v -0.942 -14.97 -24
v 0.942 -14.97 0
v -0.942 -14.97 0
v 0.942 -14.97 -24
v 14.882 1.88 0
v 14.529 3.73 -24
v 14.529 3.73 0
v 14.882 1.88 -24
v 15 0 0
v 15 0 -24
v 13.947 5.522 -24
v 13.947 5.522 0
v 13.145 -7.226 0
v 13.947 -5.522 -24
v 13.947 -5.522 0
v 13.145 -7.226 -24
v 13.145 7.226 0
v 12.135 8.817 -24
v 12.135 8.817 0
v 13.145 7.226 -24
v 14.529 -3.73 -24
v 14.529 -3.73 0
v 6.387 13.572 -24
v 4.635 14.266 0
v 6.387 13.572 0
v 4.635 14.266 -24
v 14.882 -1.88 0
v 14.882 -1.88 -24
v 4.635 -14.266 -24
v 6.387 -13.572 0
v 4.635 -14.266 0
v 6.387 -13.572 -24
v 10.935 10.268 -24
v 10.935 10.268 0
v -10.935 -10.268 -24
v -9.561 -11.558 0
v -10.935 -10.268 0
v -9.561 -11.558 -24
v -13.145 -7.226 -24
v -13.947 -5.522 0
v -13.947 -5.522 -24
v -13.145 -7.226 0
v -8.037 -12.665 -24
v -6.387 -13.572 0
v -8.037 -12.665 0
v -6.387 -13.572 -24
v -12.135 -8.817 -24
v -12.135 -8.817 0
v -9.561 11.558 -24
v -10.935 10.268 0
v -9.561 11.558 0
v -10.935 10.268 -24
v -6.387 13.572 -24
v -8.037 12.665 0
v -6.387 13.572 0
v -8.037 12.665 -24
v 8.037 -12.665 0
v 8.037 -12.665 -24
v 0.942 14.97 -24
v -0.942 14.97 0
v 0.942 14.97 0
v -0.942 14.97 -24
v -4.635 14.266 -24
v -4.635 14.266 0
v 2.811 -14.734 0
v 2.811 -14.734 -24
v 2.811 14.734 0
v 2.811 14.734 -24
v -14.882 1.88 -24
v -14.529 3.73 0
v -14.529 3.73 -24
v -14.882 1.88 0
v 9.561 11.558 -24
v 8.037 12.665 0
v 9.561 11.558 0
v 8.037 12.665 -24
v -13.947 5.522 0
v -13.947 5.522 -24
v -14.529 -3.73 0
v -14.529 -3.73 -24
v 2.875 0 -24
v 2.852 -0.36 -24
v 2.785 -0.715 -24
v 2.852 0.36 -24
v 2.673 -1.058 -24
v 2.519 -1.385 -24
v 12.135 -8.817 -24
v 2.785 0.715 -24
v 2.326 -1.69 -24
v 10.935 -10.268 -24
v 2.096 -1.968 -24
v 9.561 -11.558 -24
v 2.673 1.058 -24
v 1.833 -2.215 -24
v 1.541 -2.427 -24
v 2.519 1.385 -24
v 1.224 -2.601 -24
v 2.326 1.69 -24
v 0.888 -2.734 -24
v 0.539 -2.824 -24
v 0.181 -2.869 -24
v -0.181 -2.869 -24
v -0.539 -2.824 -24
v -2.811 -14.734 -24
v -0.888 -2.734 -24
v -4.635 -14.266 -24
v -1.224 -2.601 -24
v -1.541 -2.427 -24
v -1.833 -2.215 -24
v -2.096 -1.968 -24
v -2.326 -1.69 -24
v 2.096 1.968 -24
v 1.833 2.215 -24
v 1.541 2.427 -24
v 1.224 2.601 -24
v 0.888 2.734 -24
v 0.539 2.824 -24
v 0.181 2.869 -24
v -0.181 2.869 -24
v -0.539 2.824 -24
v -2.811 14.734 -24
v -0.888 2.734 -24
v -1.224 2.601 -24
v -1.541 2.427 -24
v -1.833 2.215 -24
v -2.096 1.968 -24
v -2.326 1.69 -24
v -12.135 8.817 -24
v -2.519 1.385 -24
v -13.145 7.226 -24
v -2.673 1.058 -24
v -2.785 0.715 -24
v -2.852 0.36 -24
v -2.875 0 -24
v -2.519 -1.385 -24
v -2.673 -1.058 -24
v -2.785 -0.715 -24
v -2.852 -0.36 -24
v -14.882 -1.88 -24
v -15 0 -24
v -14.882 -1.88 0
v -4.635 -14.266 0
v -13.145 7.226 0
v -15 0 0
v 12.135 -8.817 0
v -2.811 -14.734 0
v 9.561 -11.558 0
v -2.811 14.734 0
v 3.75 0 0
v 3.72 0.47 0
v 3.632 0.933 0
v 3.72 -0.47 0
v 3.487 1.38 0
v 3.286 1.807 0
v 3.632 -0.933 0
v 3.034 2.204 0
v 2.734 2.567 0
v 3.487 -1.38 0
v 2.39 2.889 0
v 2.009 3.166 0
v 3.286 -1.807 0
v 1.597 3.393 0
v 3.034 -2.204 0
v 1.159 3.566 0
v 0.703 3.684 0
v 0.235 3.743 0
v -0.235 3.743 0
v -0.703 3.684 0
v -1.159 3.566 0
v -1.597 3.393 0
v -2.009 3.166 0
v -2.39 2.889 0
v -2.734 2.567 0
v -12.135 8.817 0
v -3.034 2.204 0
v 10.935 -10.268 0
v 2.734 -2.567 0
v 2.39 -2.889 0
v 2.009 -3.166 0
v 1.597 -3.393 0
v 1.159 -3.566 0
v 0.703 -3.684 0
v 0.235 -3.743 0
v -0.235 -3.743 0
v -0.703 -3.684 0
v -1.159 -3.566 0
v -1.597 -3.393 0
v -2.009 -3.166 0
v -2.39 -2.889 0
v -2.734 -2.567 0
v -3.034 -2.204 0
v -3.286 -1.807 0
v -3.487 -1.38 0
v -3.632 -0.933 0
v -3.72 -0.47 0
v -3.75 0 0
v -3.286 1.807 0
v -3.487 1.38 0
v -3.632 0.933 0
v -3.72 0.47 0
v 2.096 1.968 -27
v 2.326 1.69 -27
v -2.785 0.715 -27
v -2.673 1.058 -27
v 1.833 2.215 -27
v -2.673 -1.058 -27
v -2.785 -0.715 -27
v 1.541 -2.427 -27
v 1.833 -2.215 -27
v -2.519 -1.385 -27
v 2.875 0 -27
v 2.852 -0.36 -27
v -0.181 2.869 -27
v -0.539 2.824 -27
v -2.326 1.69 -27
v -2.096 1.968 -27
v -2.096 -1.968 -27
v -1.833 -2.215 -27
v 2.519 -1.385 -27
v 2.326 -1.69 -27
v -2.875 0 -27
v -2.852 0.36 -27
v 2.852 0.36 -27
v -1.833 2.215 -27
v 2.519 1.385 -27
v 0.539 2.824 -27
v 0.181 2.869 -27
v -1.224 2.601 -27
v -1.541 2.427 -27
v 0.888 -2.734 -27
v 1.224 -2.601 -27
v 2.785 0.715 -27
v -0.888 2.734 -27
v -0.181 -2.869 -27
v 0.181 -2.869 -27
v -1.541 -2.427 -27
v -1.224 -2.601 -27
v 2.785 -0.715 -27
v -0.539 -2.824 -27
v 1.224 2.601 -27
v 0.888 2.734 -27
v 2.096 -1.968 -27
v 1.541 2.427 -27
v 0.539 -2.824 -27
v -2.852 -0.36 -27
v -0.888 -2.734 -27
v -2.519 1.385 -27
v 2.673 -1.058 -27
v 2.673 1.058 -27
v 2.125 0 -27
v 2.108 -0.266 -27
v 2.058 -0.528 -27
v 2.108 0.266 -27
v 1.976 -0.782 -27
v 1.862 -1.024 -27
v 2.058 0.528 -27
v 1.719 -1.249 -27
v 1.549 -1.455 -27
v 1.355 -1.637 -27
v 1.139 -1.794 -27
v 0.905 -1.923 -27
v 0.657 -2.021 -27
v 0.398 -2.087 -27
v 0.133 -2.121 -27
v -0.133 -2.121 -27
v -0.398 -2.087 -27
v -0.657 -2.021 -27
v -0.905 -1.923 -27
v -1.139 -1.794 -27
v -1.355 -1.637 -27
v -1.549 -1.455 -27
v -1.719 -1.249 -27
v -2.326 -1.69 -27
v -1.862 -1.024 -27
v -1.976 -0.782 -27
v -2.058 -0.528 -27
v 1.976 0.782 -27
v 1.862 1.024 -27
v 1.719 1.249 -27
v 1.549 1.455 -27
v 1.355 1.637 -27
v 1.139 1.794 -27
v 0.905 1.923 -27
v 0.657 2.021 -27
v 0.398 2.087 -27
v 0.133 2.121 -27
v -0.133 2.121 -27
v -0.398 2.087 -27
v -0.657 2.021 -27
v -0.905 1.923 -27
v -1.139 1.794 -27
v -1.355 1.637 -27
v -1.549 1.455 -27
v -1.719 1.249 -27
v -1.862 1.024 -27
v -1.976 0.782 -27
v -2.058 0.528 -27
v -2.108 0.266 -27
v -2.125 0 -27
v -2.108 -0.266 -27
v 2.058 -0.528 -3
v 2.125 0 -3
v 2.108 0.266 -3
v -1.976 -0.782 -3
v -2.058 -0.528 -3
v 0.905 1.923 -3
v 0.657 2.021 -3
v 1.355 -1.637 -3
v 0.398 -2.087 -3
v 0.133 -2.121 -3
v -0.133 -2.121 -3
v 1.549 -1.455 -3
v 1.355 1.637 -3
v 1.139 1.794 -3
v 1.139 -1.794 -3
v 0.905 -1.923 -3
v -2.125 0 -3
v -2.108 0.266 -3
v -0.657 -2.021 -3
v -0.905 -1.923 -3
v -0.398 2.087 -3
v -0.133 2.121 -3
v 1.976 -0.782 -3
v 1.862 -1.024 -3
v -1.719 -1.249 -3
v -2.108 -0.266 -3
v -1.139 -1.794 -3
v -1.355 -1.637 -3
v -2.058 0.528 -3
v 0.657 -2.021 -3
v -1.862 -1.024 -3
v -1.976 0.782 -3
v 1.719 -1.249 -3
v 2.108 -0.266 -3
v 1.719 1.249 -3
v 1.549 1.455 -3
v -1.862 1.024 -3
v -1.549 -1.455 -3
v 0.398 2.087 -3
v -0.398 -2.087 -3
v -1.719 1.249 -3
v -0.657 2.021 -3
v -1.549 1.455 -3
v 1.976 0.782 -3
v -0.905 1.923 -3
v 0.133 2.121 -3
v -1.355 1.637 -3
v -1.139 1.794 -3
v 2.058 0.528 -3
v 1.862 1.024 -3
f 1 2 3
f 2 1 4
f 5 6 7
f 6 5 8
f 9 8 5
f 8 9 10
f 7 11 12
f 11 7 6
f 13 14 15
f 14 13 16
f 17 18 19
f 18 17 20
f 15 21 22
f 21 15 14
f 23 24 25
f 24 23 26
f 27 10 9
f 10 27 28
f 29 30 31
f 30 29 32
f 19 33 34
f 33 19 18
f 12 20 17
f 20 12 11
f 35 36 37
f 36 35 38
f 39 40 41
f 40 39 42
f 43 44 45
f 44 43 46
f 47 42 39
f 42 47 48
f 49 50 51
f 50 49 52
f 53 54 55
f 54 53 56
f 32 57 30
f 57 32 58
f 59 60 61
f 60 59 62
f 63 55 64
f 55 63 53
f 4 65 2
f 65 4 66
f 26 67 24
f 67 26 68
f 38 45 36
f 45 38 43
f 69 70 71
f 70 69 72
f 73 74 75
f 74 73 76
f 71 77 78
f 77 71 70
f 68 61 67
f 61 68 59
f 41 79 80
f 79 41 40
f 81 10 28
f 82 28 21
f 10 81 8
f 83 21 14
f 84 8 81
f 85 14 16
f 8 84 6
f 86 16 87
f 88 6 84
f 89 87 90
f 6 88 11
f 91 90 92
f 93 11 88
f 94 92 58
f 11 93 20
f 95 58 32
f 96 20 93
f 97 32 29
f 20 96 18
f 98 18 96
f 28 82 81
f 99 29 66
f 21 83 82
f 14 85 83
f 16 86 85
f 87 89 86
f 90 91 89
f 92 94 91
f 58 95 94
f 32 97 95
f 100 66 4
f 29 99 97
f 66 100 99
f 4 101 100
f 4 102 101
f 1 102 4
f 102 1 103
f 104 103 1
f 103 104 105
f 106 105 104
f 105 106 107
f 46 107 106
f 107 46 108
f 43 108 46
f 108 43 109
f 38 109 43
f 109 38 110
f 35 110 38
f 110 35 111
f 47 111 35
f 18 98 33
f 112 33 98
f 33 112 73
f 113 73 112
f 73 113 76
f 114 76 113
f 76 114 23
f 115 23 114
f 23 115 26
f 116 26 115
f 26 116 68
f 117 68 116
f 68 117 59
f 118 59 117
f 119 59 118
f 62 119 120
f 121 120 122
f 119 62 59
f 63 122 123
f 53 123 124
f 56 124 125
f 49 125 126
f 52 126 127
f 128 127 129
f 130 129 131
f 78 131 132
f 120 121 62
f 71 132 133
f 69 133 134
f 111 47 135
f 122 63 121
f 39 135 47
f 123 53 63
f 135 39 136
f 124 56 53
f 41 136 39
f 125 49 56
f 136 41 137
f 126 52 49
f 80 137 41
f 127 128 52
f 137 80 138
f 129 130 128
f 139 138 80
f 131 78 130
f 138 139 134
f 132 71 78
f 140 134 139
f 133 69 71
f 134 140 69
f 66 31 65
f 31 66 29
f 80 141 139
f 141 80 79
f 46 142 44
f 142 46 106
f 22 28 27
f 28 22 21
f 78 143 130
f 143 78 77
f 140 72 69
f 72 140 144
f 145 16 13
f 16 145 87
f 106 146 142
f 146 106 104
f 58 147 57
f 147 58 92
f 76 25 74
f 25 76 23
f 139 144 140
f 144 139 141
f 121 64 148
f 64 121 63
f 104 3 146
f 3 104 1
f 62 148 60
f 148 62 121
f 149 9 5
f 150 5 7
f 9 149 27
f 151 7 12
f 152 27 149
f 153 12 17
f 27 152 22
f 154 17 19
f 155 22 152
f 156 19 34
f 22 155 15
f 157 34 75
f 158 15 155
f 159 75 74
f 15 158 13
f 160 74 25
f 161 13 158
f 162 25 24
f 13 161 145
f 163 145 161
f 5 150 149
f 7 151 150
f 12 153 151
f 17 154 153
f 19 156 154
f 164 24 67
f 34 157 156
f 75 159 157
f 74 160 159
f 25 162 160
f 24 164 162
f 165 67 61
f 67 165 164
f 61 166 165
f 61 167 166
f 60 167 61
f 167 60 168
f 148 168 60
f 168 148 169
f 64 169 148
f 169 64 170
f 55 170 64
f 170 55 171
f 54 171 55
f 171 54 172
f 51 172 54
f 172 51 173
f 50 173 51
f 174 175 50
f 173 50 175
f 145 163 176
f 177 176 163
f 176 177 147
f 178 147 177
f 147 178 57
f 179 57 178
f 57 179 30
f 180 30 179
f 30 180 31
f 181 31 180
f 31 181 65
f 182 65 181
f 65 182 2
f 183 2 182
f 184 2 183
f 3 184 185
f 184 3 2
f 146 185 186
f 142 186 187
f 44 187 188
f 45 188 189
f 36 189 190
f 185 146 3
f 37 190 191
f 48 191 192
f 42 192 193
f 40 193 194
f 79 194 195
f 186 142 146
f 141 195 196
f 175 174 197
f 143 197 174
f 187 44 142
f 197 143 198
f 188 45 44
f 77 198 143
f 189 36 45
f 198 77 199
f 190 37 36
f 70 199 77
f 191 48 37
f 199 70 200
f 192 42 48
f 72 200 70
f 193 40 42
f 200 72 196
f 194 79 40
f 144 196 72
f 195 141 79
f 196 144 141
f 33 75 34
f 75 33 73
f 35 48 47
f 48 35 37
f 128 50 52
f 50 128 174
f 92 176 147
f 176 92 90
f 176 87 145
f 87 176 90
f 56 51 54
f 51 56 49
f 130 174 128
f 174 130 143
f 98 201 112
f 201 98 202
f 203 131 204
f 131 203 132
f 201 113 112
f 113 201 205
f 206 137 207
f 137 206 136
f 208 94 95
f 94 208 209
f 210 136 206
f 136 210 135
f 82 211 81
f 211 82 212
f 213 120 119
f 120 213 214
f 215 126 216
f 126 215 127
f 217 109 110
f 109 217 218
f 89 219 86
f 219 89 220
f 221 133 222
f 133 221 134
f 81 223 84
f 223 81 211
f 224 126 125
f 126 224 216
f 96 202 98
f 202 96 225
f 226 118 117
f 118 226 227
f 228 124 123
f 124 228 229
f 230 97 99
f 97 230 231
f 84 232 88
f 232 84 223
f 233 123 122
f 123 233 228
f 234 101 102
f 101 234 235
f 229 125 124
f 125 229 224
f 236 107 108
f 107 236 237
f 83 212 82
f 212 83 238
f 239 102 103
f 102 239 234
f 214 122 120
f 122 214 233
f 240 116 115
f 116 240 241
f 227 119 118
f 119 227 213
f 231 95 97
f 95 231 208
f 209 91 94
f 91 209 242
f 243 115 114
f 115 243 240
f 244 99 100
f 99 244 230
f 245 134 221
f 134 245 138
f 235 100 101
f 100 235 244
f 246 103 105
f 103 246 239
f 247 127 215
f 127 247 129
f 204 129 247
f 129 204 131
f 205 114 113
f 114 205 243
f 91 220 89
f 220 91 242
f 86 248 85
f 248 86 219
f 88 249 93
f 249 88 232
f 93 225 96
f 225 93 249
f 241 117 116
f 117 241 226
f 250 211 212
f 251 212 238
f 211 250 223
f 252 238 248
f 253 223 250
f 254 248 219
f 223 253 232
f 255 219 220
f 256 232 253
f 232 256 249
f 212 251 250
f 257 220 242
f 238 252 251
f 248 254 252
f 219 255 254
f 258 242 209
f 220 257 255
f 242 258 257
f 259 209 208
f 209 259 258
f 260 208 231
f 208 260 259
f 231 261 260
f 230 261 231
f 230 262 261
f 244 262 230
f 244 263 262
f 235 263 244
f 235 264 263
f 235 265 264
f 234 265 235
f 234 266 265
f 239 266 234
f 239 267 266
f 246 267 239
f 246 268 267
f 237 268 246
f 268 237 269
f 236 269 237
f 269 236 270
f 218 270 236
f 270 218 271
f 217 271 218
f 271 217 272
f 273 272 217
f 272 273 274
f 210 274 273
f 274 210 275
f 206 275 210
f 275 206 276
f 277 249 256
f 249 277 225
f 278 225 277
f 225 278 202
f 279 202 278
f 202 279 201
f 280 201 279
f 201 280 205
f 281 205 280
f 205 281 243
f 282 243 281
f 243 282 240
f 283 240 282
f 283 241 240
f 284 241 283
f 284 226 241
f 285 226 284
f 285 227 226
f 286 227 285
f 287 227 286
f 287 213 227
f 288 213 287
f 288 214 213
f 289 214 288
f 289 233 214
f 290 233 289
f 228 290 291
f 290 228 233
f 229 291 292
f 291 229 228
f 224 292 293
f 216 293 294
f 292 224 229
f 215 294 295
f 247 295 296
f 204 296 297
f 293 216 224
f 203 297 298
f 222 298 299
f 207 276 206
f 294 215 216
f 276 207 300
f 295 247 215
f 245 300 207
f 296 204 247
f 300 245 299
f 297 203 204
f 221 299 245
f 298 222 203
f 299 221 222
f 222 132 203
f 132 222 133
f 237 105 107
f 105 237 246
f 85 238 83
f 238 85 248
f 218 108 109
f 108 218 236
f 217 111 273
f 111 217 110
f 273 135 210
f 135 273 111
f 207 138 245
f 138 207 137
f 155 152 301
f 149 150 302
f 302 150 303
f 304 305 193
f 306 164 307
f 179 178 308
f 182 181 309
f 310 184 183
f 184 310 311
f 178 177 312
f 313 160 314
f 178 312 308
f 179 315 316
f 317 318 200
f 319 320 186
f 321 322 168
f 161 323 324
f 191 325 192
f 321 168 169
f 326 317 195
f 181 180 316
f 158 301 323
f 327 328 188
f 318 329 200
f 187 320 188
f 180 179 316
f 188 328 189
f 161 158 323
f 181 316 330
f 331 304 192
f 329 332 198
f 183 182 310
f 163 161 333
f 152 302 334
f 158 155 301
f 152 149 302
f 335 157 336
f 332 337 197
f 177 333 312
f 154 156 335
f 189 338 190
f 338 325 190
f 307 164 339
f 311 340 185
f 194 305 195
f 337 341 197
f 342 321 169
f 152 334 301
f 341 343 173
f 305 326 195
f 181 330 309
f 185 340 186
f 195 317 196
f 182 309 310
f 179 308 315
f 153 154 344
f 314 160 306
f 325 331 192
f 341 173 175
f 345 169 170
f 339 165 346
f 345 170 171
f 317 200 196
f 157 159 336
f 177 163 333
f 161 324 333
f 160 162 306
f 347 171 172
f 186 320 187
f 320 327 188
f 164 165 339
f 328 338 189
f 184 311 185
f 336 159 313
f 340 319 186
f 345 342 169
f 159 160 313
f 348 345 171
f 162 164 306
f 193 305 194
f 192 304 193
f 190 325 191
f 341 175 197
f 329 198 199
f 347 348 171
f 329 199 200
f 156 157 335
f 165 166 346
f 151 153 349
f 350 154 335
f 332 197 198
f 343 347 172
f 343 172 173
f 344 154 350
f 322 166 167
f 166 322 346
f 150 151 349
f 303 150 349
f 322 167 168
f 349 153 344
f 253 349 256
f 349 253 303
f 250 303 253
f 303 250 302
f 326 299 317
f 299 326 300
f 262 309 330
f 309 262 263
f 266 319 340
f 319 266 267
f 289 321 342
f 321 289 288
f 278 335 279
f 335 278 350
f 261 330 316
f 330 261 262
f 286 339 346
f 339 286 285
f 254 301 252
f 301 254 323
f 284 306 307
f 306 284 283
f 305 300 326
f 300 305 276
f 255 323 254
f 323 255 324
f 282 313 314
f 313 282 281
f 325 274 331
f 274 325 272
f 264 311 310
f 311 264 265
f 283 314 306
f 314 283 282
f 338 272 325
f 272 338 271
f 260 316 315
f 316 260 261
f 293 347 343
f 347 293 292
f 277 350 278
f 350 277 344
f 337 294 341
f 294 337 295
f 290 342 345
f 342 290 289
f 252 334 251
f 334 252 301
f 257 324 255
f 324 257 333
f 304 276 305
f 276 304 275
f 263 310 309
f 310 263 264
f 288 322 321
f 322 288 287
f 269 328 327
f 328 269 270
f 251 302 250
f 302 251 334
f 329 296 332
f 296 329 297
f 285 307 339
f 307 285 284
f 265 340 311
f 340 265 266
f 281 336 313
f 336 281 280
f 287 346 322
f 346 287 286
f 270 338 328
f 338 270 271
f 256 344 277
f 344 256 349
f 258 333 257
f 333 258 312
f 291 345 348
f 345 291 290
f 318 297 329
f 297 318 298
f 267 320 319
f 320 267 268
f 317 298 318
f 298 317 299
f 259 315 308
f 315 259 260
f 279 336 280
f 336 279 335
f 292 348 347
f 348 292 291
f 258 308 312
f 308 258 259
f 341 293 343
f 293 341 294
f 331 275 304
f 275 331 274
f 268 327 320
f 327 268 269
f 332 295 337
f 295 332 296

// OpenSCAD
$fn = 50;

difference() {
	union() {
		translate(v = [0, 0, -24.0]) {
			cylinder(h = 24, r = 15.0);
		}
		#translate(v = [0, 0, -27.0]) {
			cylinder(h = 27, r = 2.875);
		}
	}
	union() {
		translate(v = [0, 0, 0]) {
			rotate(a = [0, 0, 0]) {
				difference() {
					union() {
						translate(v = [0, 0, -27.0]) {
							cylinder(h = 27, r = 2.0);
						}
						translate(v = [0, 0, -3]) {
							cylinder(h = 3, r1 = 2.125, r2 = 3.75);
						}
						translate(v = [0, 0, -27.0]) {
							cylinder(h = 27, r = 2.125);
						}
						translate(v = [0, 0, -27.0]) {
							cylinder(h = 27, r = 2.0);
						}
					}
					union();
				}
			}
		}
	}
}
